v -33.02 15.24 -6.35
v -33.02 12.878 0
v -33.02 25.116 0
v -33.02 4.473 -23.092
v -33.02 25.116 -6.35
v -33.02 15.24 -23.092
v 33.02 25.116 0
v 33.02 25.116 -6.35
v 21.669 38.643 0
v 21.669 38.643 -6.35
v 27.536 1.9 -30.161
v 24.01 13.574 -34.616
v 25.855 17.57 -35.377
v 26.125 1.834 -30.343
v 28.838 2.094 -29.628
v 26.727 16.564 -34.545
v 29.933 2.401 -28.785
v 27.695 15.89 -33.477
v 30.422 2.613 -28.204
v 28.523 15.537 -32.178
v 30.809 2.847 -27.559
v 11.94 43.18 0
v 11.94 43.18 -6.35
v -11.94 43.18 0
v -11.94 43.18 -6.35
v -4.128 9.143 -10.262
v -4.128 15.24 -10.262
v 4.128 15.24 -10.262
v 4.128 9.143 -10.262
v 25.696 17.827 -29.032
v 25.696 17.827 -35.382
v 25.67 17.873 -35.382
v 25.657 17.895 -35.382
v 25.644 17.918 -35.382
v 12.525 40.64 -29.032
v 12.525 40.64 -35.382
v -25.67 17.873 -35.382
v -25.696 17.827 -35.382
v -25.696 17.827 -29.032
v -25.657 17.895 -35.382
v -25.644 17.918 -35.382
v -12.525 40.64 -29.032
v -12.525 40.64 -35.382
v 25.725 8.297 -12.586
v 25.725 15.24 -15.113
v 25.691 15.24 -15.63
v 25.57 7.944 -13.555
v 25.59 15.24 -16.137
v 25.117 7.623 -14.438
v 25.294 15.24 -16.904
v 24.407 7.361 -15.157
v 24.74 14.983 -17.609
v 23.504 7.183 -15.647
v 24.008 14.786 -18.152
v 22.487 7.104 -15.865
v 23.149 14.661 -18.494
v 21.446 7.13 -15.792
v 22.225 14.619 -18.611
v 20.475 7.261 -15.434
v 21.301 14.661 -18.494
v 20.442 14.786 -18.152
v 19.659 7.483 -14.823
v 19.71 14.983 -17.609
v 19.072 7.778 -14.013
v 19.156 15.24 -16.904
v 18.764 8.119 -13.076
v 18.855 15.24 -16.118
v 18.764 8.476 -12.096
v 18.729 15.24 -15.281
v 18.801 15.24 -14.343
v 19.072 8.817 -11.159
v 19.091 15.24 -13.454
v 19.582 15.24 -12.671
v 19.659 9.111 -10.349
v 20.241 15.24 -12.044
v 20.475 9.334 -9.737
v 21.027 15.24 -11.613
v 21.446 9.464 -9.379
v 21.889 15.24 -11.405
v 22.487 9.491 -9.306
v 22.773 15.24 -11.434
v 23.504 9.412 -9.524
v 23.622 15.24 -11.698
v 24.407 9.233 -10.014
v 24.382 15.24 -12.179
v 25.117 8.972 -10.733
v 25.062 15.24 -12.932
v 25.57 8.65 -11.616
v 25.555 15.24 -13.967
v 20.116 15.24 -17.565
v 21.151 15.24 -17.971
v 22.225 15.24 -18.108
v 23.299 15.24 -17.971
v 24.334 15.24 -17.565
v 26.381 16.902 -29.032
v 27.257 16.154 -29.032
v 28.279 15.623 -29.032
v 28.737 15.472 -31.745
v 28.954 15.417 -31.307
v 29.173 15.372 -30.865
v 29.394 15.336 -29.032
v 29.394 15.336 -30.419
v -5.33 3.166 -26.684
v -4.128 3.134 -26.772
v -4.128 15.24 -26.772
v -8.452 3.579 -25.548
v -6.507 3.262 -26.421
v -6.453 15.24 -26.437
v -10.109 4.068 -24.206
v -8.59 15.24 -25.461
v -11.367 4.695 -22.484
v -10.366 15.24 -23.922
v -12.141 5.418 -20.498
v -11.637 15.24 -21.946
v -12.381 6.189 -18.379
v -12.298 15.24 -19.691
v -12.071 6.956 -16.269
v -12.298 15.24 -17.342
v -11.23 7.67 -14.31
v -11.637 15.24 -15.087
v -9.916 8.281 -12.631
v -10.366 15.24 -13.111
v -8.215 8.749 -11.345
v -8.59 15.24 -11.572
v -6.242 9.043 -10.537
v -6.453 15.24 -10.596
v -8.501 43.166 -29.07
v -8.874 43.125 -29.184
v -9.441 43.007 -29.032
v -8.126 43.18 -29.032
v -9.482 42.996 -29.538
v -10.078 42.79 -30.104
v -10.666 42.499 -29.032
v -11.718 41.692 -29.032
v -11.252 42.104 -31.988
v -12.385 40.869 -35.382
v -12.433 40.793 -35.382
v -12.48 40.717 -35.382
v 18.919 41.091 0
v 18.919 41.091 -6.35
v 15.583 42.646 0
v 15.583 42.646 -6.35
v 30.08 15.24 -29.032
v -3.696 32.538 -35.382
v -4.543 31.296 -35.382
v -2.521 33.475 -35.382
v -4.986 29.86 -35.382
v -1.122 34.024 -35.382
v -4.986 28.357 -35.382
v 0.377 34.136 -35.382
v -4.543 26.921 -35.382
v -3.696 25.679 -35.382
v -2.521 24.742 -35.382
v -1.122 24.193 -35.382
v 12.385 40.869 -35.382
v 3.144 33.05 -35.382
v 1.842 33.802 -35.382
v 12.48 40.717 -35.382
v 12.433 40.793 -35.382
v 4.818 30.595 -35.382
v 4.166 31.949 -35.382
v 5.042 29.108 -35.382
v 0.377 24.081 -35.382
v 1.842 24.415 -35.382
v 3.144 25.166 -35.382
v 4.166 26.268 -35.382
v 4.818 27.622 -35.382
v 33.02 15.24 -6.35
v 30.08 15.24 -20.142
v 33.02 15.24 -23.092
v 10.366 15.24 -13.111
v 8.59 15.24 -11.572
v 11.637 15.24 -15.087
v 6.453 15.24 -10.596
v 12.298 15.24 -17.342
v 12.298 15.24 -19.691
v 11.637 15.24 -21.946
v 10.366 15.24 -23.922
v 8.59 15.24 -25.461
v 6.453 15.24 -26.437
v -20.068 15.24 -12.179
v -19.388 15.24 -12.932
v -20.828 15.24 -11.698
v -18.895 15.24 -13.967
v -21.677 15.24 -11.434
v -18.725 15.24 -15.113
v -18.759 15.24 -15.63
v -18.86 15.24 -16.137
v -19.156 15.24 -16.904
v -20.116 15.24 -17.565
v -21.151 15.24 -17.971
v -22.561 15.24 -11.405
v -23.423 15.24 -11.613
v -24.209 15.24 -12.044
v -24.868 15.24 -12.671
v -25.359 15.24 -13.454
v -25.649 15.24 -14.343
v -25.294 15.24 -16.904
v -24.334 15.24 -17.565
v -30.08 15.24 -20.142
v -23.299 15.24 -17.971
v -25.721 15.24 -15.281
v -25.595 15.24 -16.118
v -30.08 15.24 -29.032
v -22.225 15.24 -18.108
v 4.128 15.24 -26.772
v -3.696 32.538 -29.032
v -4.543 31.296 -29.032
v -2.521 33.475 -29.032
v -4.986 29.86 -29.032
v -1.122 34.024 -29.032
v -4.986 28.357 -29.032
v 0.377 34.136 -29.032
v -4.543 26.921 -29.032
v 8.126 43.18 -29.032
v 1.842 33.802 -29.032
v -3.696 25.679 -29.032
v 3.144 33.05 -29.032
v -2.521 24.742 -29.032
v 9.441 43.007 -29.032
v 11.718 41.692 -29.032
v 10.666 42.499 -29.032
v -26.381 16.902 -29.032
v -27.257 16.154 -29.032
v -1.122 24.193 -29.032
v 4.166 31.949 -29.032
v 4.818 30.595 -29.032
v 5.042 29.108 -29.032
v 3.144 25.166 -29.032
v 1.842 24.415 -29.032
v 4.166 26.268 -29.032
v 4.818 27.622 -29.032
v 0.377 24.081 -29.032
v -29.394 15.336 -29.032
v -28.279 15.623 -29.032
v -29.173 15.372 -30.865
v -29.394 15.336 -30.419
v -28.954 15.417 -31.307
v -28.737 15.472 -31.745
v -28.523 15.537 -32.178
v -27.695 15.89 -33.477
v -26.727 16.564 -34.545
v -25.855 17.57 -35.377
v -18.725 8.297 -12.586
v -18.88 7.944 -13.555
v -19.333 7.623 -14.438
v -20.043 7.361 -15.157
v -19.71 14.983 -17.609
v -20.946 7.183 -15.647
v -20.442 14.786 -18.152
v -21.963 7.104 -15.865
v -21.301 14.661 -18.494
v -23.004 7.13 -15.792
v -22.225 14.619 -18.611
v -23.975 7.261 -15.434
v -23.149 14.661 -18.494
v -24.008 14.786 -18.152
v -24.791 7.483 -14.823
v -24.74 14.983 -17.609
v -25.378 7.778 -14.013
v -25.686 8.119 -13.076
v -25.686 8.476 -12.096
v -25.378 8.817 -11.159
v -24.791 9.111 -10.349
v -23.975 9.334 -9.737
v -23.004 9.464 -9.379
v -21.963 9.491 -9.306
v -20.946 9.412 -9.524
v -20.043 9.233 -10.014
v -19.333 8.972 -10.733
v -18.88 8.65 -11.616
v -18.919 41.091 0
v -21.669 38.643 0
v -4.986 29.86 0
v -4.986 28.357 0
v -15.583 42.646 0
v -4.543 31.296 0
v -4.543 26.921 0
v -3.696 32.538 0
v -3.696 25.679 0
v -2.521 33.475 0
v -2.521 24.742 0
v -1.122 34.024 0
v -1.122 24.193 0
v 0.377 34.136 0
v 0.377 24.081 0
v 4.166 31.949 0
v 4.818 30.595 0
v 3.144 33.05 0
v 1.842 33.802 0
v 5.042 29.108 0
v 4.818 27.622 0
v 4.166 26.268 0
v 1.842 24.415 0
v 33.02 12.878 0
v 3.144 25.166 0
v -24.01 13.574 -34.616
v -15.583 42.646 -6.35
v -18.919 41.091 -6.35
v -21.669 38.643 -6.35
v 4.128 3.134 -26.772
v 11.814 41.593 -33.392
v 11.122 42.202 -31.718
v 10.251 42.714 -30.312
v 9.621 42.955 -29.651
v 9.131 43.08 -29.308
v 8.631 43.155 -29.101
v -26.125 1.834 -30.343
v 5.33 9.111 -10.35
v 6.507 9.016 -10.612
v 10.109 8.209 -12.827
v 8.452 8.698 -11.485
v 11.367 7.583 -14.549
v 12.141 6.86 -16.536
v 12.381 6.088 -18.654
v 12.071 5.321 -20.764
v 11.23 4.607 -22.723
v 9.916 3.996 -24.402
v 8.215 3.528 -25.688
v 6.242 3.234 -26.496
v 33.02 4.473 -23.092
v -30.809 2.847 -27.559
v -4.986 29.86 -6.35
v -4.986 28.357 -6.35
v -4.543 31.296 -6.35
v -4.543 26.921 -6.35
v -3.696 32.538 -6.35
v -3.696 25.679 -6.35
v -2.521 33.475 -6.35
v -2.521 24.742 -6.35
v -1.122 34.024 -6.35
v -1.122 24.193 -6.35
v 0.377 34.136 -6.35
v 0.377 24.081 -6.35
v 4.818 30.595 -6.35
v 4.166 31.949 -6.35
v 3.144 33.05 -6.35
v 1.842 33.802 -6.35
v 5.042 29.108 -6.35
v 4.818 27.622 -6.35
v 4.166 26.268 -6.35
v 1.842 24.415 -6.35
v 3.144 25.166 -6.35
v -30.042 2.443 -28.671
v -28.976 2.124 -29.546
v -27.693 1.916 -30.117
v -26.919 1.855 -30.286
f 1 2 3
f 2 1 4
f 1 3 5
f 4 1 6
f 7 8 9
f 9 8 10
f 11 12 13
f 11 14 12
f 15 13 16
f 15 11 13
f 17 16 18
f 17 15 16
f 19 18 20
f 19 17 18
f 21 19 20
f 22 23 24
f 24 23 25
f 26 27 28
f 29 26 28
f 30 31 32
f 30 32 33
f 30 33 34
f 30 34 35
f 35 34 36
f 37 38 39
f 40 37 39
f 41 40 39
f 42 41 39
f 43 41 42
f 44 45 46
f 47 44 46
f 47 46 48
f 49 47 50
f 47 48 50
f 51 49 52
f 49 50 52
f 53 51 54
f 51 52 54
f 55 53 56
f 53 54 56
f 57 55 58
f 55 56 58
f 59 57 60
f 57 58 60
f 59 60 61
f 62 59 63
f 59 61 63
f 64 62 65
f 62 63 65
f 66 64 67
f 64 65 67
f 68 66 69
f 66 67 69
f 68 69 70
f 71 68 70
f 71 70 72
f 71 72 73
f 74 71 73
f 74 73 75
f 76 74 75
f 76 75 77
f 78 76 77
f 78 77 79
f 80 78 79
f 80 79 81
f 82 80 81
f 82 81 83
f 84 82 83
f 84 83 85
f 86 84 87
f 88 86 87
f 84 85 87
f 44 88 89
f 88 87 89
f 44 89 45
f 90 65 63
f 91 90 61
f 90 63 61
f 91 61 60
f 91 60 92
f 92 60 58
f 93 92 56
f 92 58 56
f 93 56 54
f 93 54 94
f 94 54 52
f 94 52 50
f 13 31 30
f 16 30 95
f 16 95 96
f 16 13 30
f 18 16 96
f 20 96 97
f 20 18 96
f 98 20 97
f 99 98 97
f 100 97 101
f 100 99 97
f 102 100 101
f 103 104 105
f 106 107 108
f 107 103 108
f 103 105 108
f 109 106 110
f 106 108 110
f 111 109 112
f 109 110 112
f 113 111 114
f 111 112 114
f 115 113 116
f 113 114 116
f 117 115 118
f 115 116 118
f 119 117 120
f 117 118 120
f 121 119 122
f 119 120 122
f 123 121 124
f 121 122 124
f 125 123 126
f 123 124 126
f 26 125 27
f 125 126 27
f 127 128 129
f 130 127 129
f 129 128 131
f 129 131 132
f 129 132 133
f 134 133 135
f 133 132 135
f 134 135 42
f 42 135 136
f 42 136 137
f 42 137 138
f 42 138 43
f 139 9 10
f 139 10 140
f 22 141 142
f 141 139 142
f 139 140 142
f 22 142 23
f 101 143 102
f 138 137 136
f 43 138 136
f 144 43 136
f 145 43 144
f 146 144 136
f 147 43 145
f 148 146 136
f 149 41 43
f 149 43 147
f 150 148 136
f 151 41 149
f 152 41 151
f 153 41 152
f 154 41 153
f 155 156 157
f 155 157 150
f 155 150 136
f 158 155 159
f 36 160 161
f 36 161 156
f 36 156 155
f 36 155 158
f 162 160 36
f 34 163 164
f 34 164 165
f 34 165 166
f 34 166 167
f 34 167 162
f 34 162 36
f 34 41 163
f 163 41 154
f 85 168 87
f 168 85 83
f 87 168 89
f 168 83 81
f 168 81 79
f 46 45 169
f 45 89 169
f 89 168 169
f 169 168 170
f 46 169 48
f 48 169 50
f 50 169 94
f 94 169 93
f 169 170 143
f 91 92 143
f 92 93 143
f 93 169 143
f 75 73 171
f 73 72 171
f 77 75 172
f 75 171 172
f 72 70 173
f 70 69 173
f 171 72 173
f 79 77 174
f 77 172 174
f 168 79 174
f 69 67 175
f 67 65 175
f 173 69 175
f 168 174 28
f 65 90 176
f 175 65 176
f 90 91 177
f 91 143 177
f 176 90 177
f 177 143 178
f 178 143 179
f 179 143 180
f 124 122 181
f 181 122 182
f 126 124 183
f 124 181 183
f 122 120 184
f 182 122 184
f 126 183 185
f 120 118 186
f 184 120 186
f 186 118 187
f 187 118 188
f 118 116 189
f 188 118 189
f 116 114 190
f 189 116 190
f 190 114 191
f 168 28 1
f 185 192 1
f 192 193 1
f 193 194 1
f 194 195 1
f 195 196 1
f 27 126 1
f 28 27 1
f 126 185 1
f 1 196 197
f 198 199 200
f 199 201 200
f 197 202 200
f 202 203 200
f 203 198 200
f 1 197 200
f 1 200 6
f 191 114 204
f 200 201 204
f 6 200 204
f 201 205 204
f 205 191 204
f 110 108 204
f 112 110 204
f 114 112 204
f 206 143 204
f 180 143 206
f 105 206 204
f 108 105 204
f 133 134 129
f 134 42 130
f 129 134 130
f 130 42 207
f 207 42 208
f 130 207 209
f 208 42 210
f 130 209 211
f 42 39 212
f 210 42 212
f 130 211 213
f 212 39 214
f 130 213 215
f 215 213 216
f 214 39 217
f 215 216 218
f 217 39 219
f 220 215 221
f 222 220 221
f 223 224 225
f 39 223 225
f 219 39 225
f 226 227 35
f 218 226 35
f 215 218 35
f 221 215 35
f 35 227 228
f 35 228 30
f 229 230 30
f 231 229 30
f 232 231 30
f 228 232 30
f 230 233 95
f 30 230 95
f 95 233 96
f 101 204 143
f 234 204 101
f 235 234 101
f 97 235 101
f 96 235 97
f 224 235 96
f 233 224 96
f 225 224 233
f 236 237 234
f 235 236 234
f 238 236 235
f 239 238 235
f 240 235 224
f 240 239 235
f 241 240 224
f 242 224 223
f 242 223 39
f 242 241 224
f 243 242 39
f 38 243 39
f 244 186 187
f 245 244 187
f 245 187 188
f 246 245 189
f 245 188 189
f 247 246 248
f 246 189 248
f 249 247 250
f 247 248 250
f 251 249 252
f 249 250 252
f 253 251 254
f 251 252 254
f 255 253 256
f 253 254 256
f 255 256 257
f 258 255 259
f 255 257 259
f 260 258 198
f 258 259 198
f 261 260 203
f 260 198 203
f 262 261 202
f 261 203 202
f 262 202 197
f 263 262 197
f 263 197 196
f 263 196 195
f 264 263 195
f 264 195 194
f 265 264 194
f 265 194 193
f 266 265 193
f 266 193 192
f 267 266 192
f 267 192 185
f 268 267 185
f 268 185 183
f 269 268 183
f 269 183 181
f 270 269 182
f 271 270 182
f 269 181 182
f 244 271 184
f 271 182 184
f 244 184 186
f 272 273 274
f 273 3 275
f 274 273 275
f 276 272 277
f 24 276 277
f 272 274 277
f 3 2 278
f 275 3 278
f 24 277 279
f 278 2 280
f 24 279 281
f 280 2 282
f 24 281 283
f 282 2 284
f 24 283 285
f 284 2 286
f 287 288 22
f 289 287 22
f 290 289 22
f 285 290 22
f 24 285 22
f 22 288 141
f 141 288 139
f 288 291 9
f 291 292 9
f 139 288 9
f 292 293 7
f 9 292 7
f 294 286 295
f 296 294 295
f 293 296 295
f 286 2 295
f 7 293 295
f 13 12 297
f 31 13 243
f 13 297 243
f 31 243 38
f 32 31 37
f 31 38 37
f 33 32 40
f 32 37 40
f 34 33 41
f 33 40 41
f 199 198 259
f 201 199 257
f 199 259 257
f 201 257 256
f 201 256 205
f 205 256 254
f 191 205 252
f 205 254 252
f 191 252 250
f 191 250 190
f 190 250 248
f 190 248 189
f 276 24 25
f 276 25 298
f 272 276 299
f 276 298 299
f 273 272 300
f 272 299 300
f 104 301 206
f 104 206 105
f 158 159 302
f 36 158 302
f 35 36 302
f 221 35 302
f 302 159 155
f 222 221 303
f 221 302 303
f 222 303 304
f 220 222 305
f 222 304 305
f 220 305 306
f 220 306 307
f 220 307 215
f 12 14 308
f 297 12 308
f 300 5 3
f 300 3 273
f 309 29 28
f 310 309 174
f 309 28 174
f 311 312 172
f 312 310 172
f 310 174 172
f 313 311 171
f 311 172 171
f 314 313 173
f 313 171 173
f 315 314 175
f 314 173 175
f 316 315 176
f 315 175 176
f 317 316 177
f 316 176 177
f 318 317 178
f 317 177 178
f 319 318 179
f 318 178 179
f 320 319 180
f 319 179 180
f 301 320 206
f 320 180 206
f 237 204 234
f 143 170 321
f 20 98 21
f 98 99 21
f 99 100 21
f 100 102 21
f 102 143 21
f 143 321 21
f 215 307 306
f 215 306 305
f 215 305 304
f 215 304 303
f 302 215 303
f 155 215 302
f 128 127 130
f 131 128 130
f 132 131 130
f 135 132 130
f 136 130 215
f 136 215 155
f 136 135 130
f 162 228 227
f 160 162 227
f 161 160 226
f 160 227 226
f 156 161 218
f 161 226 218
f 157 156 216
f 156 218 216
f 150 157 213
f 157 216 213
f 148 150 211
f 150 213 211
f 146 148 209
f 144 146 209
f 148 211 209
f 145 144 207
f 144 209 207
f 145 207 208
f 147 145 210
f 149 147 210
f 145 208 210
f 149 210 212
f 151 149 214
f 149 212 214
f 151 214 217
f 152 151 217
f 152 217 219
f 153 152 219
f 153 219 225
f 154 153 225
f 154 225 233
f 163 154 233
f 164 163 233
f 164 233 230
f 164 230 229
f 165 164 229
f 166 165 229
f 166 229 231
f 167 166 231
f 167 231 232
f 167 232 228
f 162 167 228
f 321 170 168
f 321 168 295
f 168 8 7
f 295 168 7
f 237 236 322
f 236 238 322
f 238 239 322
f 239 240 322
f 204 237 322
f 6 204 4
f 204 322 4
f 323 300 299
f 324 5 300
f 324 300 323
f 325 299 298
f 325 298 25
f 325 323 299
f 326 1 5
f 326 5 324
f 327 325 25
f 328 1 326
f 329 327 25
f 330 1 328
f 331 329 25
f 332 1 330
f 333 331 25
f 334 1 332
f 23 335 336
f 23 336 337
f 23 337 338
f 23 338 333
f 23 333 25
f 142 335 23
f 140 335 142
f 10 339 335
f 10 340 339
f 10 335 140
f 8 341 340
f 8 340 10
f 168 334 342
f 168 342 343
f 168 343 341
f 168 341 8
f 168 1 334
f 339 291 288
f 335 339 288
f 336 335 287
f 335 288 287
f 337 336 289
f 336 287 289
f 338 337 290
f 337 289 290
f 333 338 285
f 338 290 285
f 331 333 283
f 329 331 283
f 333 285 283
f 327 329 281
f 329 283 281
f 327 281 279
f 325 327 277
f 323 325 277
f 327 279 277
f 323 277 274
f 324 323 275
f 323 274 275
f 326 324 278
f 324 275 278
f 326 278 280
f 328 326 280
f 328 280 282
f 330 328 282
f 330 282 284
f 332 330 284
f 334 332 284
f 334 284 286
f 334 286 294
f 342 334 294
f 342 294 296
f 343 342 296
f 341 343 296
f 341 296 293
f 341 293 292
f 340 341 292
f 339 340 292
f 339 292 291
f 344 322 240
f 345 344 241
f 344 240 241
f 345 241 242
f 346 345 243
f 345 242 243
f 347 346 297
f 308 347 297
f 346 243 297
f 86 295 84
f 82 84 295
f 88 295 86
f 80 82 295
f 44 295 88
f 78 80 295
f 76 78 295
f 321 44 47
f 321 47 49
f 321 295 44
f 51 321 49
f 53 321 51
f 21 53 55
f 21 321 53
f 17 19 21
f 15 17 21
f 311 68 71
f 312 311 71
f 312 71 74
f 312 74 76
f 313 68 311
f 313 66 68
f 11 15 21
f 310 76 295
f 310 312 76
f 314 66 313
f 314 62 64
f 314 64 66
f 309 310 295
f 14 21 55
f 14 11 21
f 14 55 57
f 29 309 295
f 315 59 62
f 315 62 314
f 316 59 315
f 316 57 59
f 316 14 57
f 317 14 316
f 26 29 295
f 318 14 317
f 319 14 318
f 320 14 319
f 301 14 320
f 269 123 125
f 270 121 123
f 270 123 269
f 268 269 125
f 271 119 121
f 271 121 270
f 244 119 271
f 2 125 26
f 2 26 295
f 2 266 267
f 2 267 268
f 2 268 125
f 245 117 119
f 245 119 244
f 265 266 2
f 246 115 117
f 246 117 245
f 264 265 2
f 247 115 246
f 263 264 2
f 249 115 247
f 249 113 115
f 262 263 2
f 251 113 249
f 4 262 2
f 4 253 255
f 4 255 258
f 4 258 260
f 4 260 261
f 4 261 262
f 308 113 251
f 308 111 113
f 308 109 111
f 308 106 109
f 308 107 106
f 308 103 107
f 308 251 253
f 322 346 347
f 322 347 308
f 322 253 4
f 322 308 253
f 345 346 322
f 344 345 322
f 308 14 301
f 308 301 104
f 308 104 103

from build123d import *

# Parameters (mm, degrees)
BOSS_EXTRUDE1_DEPTH             = 43.18
CUT_EXTRUDE1_DEPTH              = 27.94
SKETCH6_W                       = 92.402659054
SKETCH6_H                       = 40.294164386
CUT_EXTRUDE3_DEPTH              = 25.4
TAP_DRILL_FOR_M8X1_0_TAP1_D     = 7
TAP_DRILL_FOR_M8X1_0_TAP1_DEPTH = 8.001
TAP_DRILL_FOR_M8X1_0_TAP1_TIP   = 2.103012167
CUT_EXTRUDE4_DEPTH              = 12.7
CUT_EXTRUDE5_DEPTH              = 15.24
F_3_8_CLEARANCE_HOLE1_D         = 10.0838
F_3_8_CLEARANCE_HOLE1_DEPTH     = 35.941
F_3_8_CLEARANCE_HOLE1_TIP       = 3.029479155
CUT_EXTRUDE6_DEPTH              = 15.24
CUT_EXTRUDE7_DEPTH              = 15.24
FILLET2_R                       = 12.7
FILLET3_R                       = 5.08
FILLET5_R                       = 5.08
FILLET4_R                       = 12.7
SKETCH16_W                      = 36.875028965
SKETCH16_H                      = 42.723051179
CUT_EXTRUDE8_DEPTH              = 12.7
SKETCH18_W                      = 36.753195168
SKETCH18_H                      = 42.885496241
CUT_EXTRUDE9_DEPTH              = 12.7
CUT_EXTRUDE10_DEPTH             = 65.85933151
CUT_EXTRUDE10_DEPTH_BACK        = 65.85933151


with BuildPart() as part:
    # Sketch1 → Boss-Extrude1 (new body)
    with BuildSketch(Plane(origin=(0, 0, 0), x_dir=(1, 0, 0), z_dir=(0, 1, 0))):
        Polygon((-26.9367, 35.3822), (26.9367, 35.3822), (44.45, 0), (-44.45, 0), align=None)
    extrude(amount=BOSS_EXTRUDE1_DEPTH)

    # Sketch3 → Cut-Extrude1 (cut)
    with BuildSketch(Plane(origin=(0, 43.18, 0), x_dir=(1, 0, 0), z_dir=(0, 1, 0))):
        Polygon((-30.079790452, 29.0322), (30.079790452, 29.0322), (41.306909548, 6.35), (-41.306909548, 6.35), align=None)
    extrude(amount=-CUT_EXTRUDE1_DEPTH, mode=Mode.SUBTRACT)

    # Sketch6 → Cut-Extrude3 (cut)
    with BuildSketch(Plane(origin=(0, 11.371619882, -4.138931152), x_dir=(-1, 0, 0), z_dir=(0, -0.939692620785908, 0.34202014332566977))):
        with Locations((0.08638911, 14.200910291)):
            Rectangle(SKETCH6_W, SKETCH6_H)
    extrude(amount=CUT_EXTRUDE3_DEPTH, mode=Mode.SUBTRACT)

    # Tap Drill for M8x1.0 Tap1
    with Locations(Plane(origin=(0, 11.371619882, -4.138931152), x_dir=(-1, 0, 0), z_dir=(0, -0.939692620785908, 0.3420201433256697))):
        with Locations((22.225, 8.988861466), (-22.225, 8.988861466)):
            Hole(TAP_DRILL_FOR_M8X1_0_TAP1_D / 2, depth=TAP_DRILL_FOR_M8X1_0_TAP1_DEPTH)
            with Locations((0, 0, -(TAP_DRILL_FOR_M8X1_0_TAP1_DEPTH + TAP_DRILL_FOR_M8X1_0_TAP1_TIP / 2))):  # 118° drill point
                Cone(0, TAP_DRILL_FOR_M8X1_0_TAP1_D / 2, TAP_DRILL_FOR_M8X1_0_TAP1_TIP, mode=Mode.SUBTRACT)

    # Sketch10 → Cut-Extrude4 (cut)
    with BuildSketch(Plane(origin=(0, 15.24, -4.821030939), x_dir=(1, 0, 0), z_dir=(0, -1, 0))):
        with BuildLine():
            Line((-4.1275, -5.440569061), (4.1275, -5.440569061))
            ThreePointArc((4.1275, -5.440569061), (12.3825, -13.695569061), (4.1275, -21.950569061))
            Line((4.1275, -21.950569061), (-4.1275, -21.950569061))
            ThreePointArc((-4.1275, -21.950569061), (-12.3825, -13.695569061), (-4.1275, -5.440569061))
        make_face()
    extrude(amount=CUT_EXTRUDE4_DEPTH, mode=Mode.SUBTRACT)

    # Sketch11 → Cut-Extrude5 (cut)
    with BuildSketch(Plane(origin=(0, 11.371619882, -4.138931152), x_dir=(1, 0, 0), z_dir=(0, -0.939692620785908, 0.3420201433256697))):
        Polygon((-26.9367, -33.248392247), (26.9367, -33.248392247), (29.430898409, -27.885957416), (-29.430898409, -27.885957416), align=None)
    extrude(amount=-CUT_EXTRUDE5_DEPTH, mode=Mode.SUBTRACT)

    # 3/8 Clearance Hole1
    with Locations(Plane(origin=(0, 0, -35.3822), x_dir=(-1, 0, 0), z_dir=(0, 0, -1))):
        with Locations((0, 29.1084)):
            Hole(F_3_8_CLEARANCE_HOLE1_D / 2, depth=F_3_8_CLEARANCE_HOLE1_DEPTH)
            with Locations((0, 0, -(F_3_8_CLEARANCE_HOLE1_DEPTH + F_3_8_CLEARANCE_HOLE1_TIP / 2))):  # 118° drill point
                Cone(0, F_3_8_CLEARANCE_HOLE1_D / 2, F_3_8_CLEARANCE_HOLE1_TIP, mode=Mode.SUBTRACT)

    # Sketch14 → Cut-Extrude6 (cut)
    with BuildSketch(Plane(origin=(0, 0, -35.3822), x_dir=(-1, 0, 0), z_dir=(0, 0, -1))):
        Polygon((-26.9367, 15.678710556), (-11.058823136, 43.18), (-30.079790452, 43.18), (-30.079790452, 15.24), align=None)
        Polygon((26.9367, 15.678710556), (11.058823136, 43.18), (30.079790452, 43.18), (30.079790452, 15.24), align=None)
    extrude(amount=-CUT_EXTRUDE6_DEPTH, mode=Mode.SUBTRACT)

    # Sketch15 → Cut-Extrude7 (cut)
    with BuildSketch(Plane(origin=(0, 0, -6.35), x_dir=(-1, 0, 0), z_dir=(0, 0, -1))):
        Polygon((-41.306909548, 15.24), (-17.862465853, 43.18), (-44.45, 43.18), (-44.45, 12.878067623), align=None)
        Polygon((41.306909548, 15.24), (17.862465853, 43.18), (44.45, 43.18), (44.45, 12.878067623), align=None)
    extrude(amount=-CUT_EXTRUDE7_DEPTH, mode=Mode.SUBTRACT)

    # Fillet2
    # the kernel refuses this fillet: 12.7 mm, written as the material it adds along each edge
    with BuildSketch(Plane(origin=(41.306909548, 15.24, -6.35), x_dir=(0.7994362738246867, -0.6007509002018228, 0), z_dir=(0, 0, 1))) as fillet2_piece_1_section:
        with BuildLine():
            CenterArc((FILLET2_R * 0.114610182793, FILLET2_R), FILLET2_R, 256.923695862, 13.076304138)
            Line((-FILLET2_R * 0.111638297241, FILLET2_R * 0.0259303796532), (0, 0))
            Line((0, 0), (FILLET2_R * 0.114610182793, 0))
        make_face()
    fillet2_piece_1 = extrude(amount=6.35, mode=Mode.PRIVATE)
    fillet2_piece_1 = split(fillet2_piece_1, bisect_by=Plane(origin=(42.634214794, 15.269843294, -3.668439147), z_dir=(-0.8962213844521023, 0, 0.4436070671785529)), keep=Keep.TOP, mode=Mode.PRIVATE)
    add(fillet2_piece_1)
    with BuildSketch(Plane(origin=(-41.306909548, 15.24, -6.35), x_dir=(-0.7994362738246867, -0.6007509002018229, 0), z_dir=(0, 0, 1))) as fillet2_piece_2_section:
        with BuildLine():
            CenterArc((FILLET2_R * 0.114610182793, -FILLET2_R), FILLET2_R, 90, 13.076304138)
            Line((-FILLET2_R * 0.111638297241, -FILLET2_R * 0.0259303796532), (0, 0))
            Line((0, 0), (FILLET2_R * 0.114610182793, 0))
        make_face()
    fillet2_piece_2 = extrude(amount=6.35, mode=Mode.PRIVATE)
    fillet2_piece_2 = split(fillet2_piece_2, bisect_by=Plane(origin=(-42.634214794, 15.269843294, -3.668439147), z_dir=(0.8962213844521023, 0, 0.4436070671785529)), keep=Keep.TOP, mode=Mode.PRIVATE)
    add(fillet2_piece_2)
    # the kernel refuses this fillet: 12.7 mm, written as the material it takes off along each edge
    with BuildSketch(Plane(origin=(17.862465853, 43.18, -21.155268146), x_dir=(-1, 0, 0), z_dir=(0, 0, 1)), Plane(origin=(-17.862465853, 43.18, -21.155268146), x_dir=(-0.6427876096865353, -0.7660444431189815, 0), z_dir=(0, 0, 1))) as fillet2_2_piece_1:
        with BuildLine():
            CenterArc((FILLET2_R * 0.466307658155, FILLET2_R), FILLET2_R, 220, 50)
            Line((-FILLET2_R * 0.299736784964, FILLET2_R * 0.357212390313), (0, 0))
            Line((0, 0), (FILLET2_R * 0.466307658155, 0))
        make_face()
    extrude(amount=35.960536293, mode=Mode.SUBTRACT)

    # Fillet3
    # the kernel refuses this fillet: 5.08 mm, written as the material it adds along each edge
    with BuildSketch(Plane(origin=(26.9367, 15.678710556, -35.3822), x_dir=(0.9903988653234791, -0.1382392403262007, 0), z_dir=(0, 0, 1))) as fillet3_piece_1_section:
        with BuildLine():
            CenterArc((FILLET3_R * 0.488316369793, FILLET3_R), FILLET3_R, 217.945971462, 52.054028538)
            Line((-FILLET3_R * 0.300274587293, FILLET3_R * 0.385081873416), (0, 0))
            Line((0, 0), (FILLET3_R * 0.488316369793, 0))
        make_face()
    fillet3_piece_1 = extrude(amount=6.35, mode=Mode.PRIVATE)
    fillet3_piece_1 = split(fillet3_piece_1, bisect_by=Plane(origin=(28.34322893, 16.154895704, -32.540583178), z_dir=(-0.8962213844519045, 0, 0.4436070671789527)), keep=Keep.TOP, mode=Mode.PRIVATE)
    add(fillet3_piece_1)
    with BuildSketch(Plane(origin=(-26.9367, 15.678710556, -35.3822), x_dir=(-0.9903988653234792, -0.13823924032619928, 0), z_dir=(0, 0, 1))) as fillet3_piece_2_section:
        with BuildLine():
            CenterArc((FILLET3_R * 0.488316369793, -FILLET3_R), FILLET3_R, 90, 52.054028538)
            Line((-FILLET3_R * 0.300274587293, -FILLET3_R * 0.385081873416), (0, 0))
            Line((0, 0), (FILLET3_R * 0.488316369793, 0))
        make_face()
    fillet3_piece_2 = extrude(amount=6.35, mode=Mode.PRIVATE)
    fillet3_piece_2 = split(fillet3_piece_2, bisect_by=Plane(origin=(-28.34322893, 16.154895704, -32.540583178), z_dir=(0.8962213844519045, 0, 0.4436070671789527)), keep=Keep.TOP, mode=Mode.PRIVATE)
    add(fillet3_piece_2)
    # the kernel refuses this fillet: 5.08 mm, written as the material it takes off along each edge
    with BuildSketch(Plane(origin=(11.058823136, 43.18, -42.714548419), x_dir=(0.49999999999999484, -0.8660254037844416, 0), z_dir=(0, 0, 1)), Plane(origin=(-11.058823136, 43.18, -42.714548419), x_dir=(1, 0, 0), z_dir=(0, 0, 1))) as fillet3_2_piece_1:
        with BuildLine():
            CenterArc((FILLET3_R * 0.57735026919, -FILLET3_R), FILLET3_R, 90, 60)
            Line((-FILLET3_R * 0.288675134595, -FILLET3_R * 0.5), (0, 0))
            Line((0, 0), (FILLET3_R * 0.57735026919, 0))
        make_face()
    extrude(amount=21.014696837, mode=Mode.SUBTRACT)

    # Fillet5
    fillet5_edges = [part.edges().sort_by_distance(p)[0] for p in [
        (28.183799204, 8.756385643, -32.86267978),
        (-28.183799204, 8.756385643, -32.86267978),
    ]]
    fillet(fillet5_edges, radius=FILLET5_R)

    # Fillet4
    # the kernel refuses this fillet: 12.7 mm, written as the material it takes off along each edge
    with BuildSketch(Plane(origin=(-29.229670418, 15.678710556, -35.3822), x_dir=(0, 1, 0), z_dir=(1, 0, 0))) as fillet4_piece_1:
        with BuildLine():
            CenterArc((FILLET4_R * 0.176326980708, FILLET4_R), FILLET4_R, 250, 20)
            Line((-FILLET4_R * 0.165693162617, FILLET4_R * 0.0603073792141), (0, 0))
            Line((0, 0), (FILLET4_R * 0.176326980708, 0))
        make_face()
    extrude(amount=58.459340836, mode=Mode.SUBTRACT)

    # Sketch16 → Cut-Extrude8 (cut)
    with BuildSketch(Plane(origin=(-45.72, 0, 0), x_dir=(0, 0, -1), z_dir=(1, 0, 0))):
        with Locations((17.528654939, 22.385196569)):
            Rectangle(SKETCH16_W, SKETCH16_H)
    extrude(amount=CUT_EXTRUDE8_DEPTH, mode=Mode.SUBTRACT)

    # Sketch18 → Cut-Extrude9 (cut)
    with BuildSketch(Plane.ZY.offset(-45.72)):
        with Locations((-17.752016898, 22.669475427)):
            Rectangle(SKETCH18_W, SKETCH18_H)
    extrude(amount=CUT_EXTRUDE9_DEPTH, mode=Mode.SUBTRACT)

    # Sketch19 → Cut-Extrude10 (cut, two sides: drawn at the far end of the back side and taken through both)
    with BuildSketch(Plane(origin=(0, 0, 0), x_dir=(0, 0, -1), z_dir=(1, 0, 0)).offset(-CUT_EXTRUDE10_DEPTH_BACK)):
        Polygon((29.0322, 43.18), (35.3822, 40.868789012), (35.3822, 43.18), align=None)
    extrude(amount=CUT_EXTRUDE10_DEPTH + CUT_EXTRUDE10_DEPTH_BACK, mode=Mode.SUBTRACT)


solid = part.part
